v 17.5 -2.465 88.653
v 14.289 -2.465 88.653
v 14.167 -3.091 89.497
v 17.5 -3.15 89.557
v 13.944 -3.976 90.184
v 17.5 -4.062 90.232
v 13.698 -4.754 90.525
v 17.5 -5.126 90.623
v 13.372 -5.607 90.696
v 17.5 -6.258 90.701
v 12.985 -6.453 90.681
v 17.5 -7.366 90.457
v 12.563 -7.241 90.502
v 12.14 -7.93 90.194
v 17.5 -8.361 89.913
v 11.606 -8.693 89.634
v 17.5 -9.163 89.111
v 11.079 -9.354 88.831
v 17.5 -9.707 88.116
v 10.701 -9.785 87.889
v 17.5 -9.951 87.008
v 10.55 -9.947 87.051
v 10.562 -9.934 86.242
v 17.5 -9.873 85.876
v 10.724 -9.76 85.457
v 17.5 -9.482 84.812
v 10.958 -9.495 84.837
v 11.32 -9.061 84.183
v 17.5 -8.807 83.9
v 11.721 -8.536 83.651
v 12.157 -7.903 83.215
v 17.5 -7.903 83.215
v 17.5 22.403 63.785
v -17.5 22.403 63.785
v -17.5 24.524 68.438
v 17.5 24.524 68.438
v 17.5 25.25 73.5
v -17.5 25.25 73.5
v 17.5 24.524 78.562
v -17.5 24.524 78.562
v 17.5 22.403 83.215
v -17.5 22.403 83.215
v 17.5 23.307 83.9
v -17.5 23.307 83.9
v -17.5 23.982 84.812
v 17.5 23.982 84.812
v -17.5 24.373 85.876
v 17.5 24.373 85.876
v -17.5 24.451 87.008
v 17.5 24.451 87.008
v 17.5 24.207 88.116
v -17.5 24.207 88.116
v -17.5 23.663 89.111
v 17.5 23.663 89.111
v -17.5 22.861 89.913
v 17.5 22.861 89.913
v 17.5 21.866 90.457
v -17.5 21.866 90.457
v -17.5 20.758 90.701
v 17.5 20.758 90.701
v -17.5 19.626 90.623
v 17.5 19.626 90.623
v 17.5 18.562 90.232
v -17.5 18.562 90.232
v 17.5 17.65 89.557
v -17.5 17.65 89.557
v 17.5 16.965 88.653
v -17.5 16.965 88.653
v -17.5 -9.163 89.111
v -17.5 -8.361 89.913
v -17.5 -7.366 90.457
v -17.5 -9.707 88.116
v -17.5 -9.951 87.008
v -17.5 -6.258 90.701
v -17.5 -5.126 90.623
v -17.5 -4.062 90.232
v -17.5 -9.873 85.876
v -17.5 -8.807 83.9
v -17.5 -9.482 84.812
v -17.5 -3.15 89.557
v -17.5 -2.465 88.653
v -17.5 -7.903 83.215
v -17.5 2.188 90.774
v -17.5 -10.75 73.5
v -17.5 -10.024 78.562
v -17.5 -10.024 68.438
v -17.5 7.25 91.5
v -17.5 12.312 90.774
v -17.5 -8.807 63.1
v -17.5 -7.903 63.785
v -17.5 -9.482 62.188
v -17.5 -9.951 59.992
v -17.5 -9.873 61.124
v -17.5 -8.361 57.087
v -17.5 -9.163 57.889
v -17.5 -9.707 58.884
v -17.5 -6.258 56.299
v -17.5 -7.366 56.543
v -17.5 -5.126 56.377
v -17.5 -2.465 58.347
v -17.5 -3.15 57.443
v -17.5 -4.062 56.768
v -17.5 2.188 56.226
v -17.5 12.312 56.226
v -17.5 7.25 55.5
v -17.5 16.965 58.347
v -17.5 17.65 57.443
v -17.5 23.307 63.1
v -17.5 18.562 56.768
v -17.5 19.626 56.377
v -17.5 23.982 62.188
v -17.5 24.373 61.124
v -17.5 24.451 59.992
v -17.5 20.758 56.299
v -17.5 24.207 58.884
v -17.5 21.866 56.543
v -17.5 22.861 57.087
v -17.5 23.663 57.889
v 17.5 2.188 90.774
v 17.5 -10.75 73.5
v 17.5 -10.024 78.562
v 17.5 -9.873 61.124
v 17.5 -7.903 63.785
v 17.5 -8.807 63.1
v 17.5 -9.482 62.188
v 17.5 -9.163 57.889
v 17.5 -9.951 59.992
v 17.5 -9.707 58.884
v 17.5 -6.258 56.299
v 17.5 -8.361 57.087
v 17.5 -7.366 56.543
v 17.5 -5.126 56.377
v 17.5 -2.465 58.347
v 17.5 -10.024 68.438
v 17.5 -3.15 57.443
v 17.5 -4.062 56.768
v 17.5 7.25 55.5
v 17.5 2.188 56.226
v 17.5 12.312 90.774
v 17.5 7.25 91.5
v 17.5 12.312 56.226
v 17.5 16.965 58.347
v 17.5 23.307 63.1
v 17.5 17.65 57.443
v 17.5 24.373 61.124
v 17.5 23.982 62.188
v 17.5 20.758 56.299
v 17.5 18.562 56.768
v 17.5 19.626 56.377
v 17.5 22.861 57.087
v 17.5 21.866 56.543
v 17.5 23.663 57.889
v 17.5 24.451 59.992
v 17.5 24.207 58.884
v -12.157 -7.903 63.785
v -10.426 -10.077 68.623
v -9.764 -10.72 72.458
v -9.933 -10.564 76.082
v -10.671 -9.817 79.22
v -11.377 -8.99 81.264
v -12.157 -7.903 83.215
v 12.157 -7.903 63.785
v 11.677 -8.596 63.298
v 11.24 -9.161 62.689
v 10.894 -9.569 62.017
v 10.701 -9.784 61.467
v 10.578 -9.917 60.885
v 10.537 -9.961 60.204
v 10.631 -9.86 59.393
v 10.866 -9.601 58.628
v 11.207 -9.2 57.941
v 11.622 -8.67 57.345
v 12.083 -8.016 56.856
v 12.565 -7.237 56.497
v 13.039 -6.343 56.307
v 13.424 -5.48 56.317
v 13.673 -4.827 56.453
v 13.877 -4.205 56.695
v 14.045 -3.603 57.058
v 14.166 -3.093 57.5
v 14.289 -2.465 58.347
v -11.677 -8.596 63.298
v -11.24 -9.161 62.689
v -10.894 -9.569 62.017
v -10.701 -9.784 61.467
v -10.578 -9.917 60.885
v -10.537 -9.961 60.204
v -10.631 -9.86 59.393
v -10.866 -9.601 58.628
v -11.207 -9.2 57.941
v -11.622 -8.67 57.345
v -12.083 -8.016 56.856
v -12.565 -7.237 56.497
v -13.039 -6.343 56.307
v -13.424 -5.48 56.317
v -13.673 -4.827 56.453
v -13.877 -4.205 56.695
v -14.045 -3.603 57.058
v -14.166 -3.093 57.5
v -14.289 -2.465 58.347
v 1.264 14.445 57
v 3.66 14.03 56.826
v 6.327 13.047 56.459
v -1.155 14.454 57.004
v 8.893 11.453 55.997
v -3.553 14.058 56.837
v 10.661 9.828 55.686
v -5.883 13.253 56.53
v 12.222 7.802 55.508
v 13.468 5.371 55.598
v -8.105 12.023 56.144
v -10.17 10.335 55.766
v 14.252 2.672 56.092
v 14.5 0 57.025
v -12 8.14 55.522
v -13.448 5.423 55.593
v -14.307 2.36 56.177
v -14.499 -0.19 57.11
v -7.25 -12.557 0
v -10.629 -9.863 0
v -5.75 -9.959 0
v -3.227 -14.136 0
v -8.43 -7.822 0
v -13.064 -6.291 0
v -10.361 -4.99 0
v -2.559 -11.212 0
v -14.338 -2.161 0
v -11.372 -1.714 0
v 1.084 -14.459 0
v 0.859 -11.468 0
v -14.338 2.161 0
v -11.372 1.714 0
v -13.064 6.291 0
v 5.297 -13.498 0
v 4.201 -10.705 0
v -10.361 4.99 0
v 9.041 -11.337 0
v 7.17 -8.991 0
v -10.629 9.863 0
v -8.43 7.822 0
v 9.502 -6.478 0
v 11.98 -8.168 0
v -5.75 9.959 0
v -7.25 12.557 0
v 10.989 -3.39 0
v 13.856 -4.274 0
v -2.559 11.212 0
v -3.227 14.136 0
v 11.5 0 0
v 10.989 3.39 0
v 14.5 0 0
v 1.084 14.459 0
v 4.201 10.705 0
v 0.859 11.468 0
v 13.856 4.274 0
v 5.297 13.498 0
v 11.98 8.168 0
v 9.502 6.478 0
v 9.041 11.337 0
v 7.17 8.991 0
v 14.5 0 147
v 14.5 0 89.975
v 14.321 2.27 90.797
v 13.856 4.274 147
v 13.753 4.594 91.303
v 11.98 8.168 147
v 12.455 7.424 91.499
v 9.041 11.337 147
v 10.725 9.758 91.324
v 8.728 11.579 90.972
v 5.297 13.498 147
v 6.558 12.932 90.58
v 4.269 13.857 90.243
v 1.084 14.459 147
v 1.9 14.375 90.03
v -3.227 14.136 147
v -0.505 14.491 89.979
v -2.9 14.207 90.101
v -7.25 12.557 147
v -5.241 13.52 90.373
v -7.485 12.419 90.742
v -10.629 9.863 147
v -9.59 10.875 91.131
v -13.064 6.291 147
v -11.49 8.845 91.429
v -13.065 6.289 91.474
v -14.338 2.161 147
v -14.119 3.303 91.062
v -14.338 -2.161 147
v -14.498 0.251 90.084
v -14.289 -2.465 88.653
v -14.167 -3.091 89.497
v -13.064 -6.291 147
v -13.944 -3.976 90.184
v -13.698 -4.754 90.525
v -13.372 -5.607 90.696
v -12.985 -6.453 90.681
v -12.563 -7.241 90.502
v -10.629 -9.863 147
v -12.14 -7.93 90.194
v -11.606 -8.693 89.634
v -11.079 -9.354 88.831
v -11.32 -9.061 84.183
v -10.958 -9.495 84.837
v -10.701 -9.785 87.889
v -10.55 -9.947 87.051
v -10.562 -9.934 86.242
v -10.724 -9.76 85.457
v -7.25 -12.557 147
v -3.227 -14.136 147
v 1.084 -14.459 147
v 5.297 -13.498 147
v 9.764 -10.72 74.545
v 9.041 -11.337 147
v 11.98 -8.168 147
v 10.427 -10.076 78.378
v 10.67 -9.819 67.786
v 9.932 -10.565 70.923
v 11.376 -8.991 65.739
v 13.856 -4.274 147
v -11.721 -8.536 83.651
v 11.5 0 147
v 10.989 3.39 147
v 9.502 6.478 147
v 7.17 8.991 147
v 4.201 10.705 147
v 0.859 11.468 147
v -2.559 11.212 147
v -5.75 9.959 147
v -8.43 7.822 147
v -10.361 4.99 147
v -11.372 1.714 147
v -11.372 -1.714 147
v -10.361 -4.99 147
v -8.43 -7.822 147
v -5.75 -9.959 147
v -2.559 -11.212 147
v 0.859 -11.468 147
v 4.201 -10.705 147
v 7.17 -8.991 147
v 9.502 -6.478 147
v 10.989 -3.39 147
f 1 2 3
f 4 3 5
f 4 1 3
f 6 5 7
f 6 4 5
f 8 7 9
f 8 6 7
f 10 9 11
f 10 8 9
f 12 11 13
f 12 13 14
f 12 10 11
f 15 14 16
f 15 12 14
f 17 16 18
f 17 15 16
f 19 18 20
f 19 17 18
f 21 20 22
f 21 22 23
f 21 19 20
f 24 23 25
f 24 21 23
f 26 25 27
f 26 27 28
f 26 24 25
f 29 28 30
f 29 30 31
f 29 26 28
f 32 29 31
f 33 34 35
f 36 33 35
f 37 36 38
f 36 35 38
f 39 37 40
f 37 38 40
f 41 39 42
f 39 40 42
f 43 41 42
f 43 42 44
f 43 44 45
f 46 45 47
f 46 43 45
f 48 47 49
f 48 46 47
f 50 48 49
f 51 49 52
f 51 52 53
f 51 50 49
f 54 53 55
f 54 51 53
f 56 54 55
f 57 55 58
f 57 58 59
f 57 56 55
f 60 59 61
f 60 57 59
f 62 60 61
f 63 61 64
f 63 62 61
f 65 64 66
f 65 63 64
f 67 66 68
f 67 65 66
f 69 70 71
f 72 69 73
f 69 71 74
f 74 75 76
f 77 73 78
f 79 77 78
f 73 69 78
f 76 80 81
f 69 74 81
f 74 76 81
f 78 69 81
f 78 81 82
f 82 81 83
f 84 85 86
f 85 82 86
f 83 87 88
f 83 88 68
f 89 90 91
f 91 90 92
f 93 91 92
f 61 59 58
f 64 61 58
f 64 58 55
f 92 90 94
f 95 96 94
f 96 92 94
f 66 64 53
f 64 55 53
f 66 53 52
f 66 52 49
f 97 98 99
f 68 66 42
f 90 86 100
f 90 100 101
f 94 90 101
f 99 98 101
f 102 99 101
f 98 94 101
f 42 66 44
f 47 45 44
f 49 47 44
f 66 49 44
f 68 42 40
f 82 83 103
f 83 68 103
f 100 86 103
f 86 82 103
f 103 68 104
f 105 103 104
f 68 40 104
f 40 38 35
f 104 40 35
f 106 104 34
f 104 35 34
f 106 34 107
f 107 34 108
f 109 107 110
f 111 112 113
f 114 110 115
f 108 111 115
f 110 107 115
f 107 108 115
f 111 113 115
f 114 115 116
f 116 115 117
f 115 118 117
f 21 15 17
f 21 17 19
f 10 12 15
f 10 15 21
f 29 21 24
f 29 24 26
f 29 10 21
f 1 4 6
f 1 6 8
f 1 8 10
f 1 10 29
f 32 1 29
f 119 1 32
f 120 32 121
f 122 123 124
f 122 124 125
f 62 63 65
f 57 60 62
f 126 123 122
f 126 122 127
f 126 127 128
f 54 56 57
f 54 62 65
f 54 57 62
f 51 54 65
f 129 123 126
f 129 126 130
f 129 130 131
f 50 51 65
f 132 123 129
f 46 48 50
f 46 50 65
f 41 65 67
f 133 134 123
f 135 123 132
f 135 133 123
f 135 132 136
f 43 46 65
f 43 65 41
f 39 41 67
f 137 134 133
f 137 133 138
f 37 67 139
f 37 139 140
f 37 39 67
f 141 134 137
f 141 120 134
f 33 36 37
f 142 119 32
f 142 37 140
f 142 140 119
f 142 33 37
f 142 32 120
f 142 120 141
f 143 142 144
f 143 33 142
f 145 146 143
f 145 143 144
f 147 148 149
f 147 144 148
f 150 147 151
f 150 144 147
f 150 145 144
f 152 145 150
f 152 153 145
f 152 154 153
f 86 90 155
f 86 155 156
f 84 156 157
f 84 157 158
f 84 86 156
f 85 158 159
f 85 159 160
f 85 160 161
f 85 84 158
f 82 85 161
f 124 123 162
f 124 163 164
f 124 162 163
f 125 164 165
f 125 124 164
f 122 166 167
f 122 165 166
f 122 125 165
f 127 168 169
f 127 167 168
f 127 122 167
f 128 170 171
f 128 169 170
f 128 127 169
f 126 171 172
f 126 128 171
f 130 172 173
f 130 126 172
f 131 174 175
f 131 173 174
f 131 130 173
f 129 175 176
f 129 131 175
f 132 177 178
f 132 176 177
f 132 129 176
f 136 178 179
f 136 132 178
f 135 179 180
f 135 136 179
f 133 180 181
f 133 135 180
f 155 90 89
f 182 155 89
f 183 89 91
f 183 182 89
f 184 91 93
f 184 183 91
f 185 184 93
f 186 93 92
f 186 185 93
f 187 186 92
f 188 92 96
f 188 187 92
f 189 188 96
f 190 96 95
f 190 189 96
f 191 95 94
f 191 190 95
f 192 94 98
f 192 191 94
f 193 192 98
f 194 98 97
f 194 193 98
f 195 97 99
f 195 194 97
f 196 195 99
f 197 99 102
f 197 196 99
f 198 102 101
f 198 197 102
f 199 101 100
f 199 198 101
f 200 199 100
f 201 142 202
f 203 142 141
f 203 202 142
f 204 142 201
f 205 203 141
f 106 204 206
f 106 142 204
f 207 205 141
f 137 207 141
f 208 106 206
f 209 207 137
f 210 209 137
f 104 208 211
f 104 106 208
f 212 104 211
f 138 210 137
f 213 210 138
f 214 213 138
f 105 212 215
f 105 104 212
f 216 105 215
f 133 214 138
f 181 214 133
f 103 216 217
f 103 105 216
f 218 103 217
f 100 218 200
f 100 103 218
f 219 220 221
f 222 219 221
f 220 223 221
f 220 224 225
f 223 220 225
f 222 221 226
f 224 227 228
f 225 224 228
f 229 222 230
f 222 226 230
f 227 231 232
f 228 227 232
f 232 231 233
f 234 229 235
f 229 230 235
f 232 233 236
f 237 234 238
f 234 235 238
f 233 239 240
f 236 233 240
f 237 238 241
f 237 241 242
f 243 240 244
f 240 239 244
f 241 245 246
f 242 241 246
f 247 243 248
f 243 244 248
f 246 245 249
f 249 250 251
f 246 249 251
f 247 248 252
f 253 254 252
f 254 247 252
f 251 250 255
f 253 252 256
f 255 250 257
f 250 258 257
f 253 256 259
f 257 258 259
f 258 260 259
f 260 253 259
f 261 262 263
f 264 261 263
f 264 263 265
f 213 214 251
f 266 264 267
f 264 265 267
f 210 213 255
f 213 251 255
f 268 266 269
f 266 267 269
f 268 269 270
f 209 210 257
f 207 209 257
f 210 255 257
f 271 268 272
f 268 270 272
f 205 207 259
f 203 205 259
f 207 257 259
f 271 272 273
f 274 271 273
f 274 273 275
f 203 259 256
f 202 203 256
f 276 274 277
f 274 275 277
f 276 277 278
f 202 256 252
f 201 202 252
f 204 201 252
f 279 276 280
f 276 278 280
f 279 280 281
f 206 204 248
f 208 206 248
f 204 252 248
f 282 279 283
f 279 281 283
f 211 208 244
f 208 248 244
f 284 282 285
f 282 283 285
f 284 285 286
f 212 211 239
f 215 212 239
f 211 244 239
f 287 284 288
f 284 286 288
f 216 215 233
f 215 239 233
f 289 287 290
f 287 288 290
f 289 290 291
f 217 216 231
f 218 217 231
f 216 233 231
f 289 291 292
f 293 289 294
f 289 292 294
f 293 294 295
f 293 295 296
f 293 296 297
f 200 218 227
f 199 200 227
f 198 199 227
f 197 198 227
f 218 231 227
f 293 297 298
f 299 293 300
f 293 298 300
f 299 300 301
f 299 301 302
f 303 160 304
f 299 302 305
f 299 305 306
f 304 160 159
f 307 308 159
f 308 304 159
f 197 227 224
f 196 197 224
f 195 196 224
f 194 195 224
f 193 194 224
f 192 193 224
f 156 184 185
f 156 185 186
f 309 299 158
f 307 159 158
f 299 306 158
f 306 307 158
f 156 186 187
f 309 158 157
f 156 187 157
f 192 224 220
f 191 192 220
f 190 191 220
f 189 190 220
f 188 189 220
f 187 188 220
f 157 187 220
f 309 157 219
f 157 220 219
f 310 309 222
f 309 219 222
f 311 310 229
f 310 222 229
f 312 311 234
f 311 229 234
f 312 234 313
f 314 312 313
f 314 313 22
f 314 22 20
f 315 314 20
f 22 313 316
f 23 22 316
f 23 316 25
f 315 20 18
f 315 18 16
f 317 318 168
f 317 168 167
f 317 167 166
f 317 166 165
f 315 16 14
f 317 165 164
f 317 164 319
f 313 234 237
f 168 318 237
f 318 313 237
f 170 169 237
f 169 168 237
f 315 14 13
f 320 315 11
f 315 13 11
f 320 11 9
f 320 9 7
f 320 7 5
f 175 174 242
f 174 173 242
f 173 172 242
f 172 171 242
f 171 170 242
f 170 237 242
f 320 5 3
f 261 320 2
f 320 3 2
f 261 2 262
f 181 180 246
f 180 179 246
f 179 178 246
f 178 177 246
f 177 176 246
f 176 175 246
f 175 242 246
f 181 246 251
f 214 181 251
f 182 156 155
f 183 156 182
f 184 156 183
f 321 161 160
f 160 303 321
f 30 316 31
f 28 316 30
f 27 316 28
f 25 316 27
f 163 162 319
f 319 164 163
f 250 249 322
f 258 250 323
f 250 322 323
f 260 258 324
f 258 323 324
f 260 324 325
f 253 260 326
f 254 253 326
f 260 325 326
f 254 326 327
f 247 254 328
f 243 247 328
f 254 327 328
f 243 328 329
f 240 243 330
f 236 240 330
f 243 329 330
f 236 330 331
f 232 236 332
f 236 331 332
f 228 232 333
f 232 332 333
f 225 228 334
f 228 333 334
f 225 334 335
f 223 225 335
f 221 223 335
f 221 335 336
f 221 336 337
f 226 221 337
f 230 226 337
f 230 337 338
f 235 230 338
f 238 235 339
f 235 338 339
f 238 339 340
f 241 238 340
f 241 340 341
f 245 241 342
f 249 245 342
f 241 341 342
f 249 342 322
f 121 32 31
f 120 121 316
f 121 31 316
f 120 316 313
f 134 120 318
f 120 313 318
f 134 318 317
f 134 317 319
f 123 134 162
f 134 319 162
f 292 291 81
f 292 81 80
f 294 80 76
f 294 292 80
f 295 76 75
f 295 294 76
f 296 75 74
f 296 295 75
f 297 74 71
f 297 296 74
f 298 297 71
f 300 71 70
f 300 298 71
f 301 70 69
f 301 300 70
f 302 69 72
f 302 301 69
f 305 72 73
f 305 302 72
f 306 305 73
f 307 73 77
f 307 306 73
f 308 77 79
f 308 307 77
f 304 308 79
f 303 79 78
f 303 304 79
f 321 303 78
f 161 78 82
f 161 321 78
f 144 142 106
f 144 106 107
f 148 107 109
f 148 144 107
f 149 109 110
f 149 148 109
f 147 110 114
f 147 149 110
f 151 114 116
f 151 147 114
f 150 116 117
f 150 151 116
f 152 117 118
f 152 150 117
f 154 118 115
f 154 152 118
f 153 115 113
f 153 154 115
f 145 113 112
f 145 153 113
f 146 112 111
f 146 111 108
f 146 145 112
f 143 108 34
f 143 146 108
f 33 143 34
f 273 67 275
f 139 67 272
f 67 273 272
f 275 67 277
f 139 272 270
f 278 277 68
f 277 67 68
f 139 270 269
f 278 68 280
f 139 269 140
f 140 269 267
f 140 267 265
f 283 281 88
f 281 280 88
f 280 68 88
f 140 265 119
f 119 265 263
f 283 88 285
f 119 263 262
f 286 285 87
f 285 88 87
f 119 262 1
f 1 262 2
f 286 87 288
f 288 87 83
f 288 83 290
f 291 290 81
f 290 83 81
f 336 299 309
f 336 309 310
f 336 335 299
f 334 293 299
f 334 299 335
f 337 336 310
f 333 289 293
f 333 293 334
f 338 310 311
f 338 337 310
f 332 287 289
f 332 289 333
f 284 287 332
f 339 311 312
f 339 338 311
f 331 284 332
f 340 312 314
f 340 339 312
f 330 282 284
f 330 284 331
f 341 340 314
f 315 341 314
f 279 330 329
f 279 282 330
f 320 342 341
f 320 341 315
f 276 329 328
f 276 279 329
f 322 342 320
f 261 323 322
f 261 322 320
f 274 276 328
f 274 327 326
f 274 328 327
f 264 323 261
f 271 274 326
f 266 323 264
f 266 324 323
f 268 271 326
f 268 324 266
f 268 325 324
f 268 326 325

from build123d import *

# Parameters (mm, degrees)
SKETCH1_R           = 14.5
BOSS_EXTRUDE1_DEPTH = 147
SKETCH3_R           = 18
BOSS_EXTRUDE2_DEPTH = 17.5
BOSS_EXTRUDE3_START = 17.5
SKETCH4_R           = 18
BOSS_EXTRUDE3_DEPTH = 17.5
SKETCH5_R           = 4
BOSS_EXTRUDE4_DEPTH = 35
SKETCH2_R           = 11.5
CUT_EXTRUDE1_DEPTH  = 147


with BuildPart() as part:
    # Sketch1 → Boss-Extrude1 (new body)
    with BuildSketch(Plane.XY):
        Circle(SKETCH1_R)
    extrude(amount=BOSS_EXTRUDE1_DEPTH)

    # Sketch3 → Boss-Extrude2 (add)
    with BuildSketch(Plane(origin=(0, 0, 0), x_dir=(0, 0, -1), z_dir=(1, 0, 0))):
        with Locations(Location((-73.5, 7.25, 0), (0, 0, 156.248053974))):
            Circle(SKETCH3_R)
    extrude(amount=BOSS_EXTRUDE2_DEPTH)

    # Sketch4 → Boss-Extrude3 (add)
    with BuildSketch(Plane.ZY.offset(BOSS_EXTRUDE3_START)):
        with Locations((73.5, 7.25)):
            Circle(SKETCH4_R)
    extrude(amount=-BOSS_EXTRUDE3_DEPTH)

    # Sketch5 → Boss-Extrude4 (add)
    with BuildSketch(Plane(origin=(17.5, 0, 0), x_dir=(0, 0, -1), z_dir=(1, 0, 0))):
        with Locations((-60.288298956, 20.461701044)):
            Circle(SKETCH5_R)
        with Locations((-86.711701044, 20.461701044)):
            Circle(SKETCH5_R)
        with Locations((-60.288298956, -5.961701044)):
            Circle(SKETCH5_R)
        with Locations((-86.711701044, -5.961701044)):
            Circle(SKETCH5_R)
    extrude(amount=-BOSS_EXTRUDE4_DEPTH)

    # Sketch2 → Cut-Extrude1 (cut)
    with BuildSketch(Plane.XY.offset(147)):
        Circle(SKETCH2_R)
    extrude(amount=-CUT_EXTRUDE1_DEPTH, mode=Mode.SUBTRACT)


solid = part.part
